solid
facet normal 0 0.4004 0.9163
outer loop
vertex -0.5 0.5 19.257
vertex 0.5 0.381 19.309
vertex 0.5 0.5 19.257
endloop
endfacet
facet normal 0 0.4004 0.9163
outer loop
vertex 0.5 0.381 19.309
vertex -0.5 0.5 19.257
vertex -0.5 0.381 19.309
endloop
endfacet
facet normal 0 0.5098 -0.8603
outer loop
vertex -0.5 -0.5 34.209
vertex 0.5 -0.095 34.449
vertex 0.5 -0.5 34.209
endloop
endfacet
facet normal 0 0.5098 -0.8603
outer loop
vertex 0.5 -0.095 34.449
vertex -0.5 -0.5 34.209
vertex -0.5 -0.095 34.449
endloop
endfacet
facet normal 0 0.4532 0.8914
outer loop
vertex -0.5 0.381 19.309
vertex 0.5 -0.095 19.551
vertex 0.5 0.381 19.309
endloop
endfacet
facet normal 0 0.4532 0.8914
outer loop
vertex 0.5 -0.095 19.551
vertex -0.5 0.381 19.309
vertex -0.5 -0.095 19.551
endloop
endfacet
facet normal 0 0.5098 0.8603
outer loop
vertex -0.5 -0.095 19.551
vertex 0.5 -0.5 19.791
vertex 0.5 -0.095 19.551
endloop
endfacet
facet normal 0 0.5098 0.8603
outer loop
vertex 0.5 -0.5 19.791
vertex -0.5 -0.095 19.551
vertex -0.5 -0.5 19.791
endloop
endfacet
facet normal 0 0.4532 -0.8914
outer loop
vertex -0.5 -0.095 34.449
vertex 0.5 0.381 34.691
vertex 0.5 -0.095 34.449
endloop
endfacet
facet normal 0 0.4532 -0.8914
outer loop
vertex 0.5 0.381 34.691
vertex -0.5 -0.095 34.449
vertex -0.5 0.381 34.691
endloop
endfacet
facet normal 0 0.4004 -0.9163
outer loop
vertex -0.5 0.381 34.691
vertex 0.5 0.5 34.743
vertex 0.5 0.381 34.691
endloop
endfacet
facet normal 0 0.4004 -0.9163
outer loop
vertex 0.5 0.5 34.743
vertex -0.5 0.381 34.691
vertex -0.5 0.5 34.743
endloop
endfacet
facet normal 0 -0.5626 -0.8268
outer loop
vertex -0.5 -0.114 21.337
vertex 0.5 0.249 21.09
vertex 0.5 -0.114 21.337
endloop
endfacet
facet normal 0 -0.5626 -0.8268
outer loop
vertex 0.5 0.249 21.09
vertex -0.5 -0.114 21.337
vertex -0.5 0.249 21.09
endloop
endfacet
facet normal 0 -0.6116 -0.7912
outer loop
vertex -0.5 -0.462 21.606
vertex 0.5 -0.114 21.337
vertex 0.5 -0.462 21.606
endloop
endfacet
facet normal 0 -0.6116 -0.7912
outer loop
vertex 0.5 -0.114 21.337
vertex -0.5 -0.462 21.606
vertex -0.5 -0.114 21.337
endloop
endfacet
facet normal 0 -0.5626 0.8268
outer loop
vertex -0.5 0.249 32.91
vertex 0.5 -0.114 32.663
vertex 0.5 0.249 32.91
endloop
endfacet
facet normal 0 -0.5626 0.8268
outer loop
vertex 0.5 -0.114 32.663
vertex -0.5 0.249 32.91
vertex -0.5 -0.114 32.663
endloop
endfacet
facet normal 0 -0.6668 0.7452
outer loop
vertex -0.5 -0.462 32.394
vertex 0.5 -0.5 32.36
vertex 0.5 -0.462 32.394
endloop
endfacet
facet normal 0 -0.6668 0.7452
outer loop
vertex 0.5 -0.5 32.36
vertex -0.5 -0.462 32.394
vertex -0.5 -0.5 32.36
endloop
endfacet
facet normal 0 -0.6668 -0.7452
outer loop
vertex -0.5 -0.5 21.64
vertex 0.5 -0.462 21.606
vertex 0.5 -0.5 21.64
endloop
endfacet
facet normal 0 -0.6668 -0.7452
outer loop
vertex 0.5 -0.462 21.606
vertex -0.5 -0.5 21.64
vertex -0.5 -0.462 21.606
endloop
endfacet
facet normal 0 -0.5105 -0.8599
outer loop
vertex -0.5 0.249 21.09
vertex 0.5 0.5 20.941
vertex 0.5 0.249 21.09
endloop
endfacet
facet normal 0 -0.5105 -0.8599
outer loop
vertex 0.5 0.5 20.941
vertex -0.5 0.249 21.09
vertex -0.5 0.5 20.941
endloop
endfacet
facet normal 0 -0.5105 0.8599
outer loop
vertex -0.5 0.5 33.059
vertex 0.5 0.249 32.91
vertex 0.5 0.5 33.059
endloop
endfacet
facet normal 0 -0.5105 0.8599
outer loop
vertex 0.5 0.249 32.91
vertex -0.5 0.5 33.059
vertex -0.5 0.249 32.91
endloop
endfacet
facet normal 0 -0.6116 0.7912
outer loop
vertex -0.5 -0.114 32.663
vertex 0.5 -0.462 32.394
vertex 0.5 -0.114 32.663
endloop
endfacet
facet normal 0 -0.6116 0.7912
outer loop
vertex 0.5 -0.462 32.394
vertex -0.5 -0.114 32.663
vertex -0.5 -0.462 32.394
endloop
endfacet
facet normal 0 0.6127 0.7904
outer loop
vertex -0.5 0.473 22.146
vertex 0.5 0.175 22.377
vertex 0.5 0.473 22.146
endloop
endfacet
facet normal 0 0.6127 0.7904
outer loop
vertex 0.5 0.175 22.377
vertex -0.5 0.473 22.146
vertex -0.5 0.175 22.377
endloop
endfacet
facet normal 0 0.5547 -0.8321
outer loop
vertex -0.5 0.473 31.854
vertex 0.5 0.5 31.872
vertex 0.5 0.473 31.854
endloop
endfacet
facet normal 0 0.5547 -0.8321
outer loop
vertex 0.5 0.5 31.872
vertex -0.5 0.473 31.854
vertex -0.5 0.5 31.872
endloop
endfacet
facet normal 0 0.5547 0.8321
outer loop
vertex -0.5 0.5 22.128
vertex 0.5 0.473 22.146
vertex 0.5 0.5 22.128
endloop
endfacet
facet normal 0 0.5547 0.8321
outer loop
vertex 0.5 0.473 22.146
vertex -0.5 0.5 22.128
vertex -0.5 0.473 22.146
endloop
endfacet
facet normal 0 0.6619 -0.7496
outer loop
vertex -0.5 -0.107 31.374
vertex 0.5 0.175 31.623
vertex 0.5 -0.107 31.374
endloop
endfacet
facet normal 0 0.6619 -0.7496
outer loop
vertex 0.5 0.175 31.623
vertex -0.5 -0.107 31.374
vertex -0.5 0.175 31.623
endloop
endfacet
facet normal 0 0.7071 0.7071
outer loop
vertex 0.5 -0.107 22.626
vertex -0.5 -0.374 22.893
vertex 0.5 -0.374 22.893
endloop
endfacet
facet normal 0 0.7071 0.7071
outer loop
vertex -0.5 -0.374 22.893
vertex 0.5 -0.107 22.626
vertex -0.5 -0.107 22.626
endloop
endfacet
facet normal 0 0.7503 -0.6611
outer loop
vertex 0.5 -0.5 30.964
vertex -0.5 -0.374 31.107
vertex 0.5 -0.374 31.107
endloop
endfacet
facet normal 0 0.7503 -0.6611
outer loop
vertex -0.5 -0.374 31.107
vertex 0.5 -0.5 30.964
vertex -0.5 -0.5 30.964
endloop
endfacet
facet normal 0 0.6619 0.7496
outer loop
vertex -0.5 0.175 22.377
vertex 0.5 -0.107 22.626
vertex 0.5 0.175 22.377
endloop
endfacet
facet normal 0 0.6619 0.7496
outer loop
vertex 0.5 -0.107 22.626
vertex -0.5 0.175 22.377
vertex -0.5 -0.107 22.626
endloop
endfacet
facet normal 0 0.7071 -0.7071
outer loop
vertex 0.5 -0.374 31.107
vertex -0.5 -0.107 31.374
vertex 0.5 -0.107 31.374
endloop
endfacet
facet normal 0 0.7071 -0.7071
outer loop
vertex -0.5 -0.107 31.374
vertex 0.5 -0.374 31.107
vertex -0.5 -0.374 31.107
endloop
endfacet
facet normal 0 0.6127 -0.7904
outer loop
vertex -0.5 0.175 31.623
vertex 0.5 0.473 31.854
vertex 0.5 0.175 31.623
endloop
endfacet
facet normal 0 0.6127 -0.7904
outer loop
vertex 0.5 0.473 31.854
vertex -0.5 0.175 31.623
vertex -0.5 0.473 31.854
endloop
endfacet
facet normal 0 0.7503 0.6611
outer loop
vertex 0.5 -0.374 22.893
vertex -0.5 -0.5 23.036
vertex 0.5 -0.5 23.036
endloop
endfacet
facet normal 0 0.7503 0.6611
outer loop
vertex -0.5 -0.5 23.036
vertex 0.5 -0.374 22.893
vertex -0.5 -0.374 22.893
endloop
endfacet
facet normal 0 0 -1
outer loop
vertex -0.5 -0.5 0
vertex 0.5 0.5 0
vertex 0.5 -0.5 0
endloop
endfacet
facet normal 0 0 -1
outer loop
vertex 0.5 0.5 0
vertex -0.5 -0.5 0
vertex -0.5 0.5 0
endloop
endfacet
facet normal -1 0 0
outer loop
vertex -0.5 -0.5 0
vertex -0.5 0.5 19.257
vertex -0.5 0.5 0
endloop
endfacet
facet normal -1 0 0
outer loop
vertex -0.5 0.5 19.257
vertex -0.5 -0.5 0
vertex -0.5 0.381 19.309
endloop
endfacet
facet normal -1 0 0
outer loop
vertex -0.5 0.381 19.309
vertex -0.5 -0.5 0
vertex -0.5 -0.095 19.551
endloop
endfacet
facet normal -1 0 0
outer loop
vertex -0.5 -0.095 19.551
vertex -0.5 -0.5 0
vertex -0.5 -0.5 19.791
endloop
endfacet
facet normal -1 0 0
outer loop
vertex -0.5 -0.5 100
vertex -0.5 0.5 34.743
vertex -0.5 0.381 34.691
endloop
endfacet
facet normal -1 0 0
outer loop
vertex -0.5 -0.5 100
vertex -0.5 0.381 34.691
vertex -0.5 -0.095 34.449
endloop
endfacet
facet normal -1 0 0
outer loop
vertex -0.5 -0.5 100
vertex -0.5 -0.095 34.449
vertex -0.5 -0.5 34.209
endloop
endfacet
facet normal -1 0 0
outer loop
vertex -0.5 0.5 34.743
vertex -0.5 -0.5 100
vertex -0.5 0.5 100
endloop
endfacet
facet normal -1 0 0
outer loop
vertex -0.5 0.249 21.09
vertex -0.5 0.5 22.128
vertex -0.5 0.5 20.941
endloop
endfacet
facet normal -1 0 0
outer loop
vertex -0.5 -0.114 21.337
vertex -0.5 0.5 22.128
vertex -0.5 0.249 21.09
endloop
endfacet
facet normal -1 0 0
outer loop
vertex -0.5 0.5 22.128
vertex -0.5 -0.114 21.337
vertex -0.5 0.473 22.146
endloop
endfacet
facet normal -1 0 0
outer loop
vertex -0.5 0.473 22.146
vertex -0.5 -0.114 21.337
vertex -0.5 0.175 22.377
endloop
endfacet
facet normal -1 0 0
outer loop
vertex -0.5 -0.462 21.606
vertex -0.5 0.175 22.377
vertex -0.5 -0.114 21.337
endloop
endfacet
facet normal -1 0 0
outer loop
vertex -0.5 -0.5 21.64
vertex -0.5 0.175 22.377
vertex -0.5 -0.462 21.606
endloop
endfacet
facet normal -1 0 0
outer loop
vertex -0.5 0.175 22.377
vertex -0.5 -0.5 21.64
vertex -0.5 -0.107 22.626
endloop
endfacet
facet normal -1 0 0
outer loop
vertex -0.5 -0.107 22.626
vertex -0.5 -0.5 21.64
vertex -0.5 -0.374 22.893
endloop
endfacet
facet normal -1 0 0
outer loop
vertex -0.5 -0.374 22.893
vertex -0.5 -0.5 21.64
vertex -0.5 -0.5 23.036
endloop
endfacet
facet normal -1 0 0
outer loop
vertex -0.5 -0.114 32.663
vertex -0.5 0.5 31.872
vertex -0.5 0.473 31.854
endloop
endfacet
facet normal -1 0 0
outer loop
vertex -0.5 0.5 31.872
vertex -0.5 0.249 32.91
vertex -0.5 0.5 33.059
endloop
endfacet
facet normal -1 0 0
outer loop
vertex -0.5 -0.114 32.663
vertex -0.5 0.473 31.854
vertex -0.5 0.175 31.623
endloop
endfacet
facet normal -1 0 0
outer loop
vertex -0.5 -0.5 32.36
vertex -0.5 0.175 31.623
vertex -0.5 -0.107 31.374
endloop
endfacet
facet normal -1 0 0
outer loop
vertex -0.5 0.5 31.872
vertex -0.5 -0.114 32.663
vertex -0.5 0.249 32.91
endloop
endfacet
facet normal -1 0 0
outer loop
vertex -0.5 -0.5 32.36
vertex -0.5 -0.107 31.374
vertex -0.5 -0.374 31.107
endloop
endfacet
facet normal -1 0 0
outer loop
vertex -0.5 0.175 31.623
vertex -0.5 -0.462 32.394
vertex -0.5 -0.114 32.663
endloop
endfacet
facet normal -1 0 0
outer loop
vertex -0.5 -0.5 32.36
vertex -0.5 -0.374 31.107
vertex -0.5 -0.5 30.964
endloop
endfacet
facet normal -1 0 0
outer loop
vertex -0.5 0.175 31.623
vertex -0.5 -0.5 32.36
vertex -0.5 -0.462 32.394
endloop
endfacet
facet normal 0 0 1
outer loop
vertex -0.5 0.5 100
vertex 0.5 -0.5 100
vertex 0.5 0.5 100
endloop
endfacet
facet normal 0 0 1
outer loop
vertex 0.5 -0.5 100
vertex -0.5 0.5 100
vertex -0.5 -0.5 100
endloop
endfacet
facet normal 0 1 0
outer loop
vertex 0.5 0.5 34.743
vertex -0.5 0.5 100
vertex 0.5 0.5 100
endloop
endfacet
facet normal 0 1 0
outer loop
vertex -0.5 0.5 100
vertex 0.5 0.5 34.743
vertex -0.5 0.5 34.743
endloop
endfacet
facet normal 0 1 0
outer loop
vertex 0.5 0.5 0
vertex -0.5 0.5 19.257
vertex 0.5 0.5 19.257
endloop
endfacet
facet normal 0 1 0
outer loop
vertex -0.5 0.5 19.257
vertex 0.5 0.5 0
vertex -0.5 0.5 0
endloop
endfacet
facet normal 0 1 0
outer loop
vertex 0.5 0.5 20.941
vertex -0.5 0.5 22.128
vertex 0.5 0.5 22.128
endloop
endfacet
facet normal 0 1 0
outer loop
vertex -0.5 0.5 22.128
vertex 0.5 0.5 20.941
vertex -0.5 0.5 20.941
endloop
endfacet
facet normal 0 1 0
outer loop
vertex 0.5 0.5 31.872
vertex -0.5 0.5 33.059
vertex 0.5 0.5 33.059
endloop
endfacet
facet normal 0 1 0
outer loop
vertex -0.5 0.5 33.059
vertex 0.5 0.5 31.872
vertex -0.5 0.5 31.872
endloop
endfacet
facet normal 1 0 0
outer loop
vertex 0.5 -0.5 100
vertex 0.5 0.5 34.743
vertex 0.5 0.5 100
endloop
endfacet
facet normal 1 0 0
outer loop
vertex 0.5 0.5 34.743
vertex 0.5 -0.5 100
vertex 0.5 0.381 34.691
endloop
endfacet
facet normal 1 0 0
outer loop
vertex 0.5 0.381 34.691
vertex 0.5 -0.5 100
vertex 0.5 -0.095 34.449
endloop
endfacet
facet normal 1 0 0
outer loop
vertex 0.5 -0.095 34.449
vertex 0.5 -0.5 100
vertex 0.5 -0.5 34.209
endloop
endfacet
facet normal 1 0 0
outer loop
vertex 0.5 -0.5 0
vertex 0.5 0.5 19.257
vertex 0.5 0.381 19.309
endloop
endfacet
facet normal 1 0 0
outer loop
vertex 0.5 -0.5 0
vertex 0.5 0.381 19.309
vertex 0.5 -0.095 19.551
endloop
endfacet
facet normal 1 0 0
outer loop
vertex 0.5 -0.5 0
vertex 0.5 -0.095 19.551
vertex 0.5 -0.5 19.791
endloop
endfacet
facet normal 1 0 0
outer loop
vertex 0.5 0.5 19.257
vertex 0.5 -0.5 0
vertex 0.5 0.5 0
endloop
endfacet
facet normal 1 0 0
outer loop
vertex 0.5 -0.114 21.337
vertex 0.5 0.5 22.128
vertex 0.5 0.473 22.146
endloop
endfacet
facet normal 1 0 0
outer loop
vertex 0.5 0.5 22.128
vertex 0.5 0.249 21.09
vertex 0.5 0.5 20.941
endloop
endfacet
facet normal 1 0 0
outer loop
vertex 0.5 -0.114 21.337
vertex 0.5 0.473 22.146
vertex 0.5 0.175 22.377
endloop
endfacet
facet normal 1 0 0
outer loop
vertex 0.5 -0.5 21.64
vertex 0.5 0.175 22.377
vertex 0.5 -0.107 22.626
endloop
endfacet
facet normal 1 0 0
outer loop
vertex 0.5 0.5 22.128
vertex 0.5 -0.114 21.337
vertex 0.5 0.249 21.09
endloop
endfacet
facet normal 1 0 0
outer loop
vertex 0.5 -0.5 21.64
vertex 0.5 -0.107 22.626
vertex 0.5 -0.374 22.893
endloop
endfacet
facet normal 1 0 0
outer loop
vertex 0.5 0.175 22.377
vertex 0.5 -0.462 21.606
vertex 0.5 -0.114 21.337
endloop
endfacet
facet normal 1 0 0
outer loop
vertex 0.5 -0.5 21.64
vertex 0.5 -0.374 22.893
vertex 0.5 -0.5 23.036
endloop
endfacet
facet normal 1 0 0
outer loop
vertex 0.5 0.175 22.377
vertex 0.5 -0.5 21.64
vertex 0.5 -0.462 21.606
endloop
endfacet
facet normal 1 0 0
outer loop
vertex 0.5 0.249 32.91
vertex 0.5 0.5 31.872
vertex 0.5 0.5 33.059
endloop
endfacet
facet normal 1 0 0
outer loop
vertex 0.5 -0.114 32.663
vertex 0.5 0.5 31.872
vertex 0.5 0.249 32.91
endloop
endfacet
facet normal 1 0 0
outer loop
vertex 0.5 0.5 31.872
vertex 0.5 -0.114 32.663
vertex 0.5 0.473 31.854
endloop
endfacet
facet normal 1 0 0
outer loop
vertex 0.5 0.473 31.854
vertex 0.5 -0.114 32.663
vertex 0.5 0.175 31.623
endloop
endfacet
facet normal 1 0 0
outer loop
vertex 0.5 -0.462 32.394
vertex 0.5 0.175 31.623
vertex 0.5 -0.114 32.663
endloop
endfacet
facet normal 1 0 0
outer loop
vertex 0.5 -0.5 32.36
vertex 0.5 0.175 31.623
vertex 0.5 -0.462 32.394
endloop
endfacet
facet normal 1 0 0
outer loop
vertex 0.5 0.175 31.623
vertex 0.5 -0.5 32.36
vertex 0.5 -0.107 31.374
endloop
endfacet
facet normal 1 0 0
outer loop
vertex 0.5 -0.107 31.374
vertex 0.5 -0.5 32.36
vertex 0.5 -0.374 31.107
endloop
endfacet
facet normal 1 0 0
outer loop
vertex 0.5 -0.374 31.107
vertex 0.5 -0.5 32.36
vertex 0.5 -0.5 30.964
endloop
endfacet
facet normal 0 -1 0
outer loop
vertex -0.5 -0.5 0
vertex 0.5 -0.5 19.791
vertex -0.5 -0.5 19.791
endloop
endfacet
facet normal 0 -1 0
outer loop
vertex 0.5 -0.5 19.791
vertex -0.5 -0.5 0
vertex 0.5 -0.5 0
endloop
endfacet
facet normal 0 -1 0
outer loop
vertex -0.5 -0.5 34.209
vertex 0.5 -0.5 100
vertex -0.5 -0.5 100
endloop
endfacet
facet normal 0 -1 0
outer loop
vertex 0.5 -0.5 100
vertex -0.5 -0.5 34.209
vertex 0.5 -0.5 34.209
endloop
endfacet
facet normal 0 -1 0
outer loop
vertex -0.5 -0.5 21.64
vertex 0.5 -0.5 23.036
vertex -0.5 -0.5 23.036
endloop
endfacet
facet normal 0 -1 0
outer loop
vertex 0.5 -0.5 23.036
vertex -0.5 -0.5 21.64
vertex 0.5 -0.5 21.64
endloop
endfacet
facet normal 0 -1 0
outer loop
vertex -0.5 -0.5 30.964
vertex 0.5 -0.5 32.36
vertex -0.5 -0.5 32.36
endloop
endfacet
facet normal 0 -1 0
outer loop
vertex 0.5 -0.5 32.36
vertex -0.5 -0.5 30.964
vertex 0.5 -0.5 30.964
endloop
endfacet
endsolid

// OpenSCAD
// file: roundedcube.scad
// Higher definition curves
$fs = 0.01;

module roundedcube(size = [1, 1, 1], center = false, radius = 0.5, apply_to = "all") {
	// If single value, convert to [x, y, z] vector
	size = (size[0] == undef) ? [size, size, size] : size;

	translate_min = radius;
	translate_xmax = size[0] - radius;
	translate_ymax = size[1] - radius;
	translate_zmax = size[2] - radius;

	diameter = radius * 2;

	module build_point(type = "sphere", rotate = [0, 0, 0]) {
		if (type == "sphere") {
			sphere(r = radius);
		} else if (type == "cylinder") {
			rotate(a = rotate)
			cylinder(h = diameter, r = radius, center = true);
		}
	}

	obj_translate = (center == false) ?
		[0, 0, 0] : [
			-(size[0] / 2),
			-(size[1] / 2),
			-(size[2] / 2)
		];

	translate(v = obj_translate) {
		hull() {
			for (translate_x = [translate_min, translate_xmax]) {
				x_at = (translate_x == translate_min) ? "min" : "max";
				for (translate_y = [translate_min, translate_ymax]) {
					y_at = (translate_y == translate_min) ? "min" : "max";
					for (translate_z = [translate_min, translate_zmax]) {
						z_at = (translate_z == translate_min) ? "min" : "max";

						translate(v = [translate_x, translate_y, translate_z])
						if (
							(apply_to == "all") ||
							(apply_to == "xmin" && x_at == "min") || (apply_to == "xmax" && x_at == "max") ||
							(apply_to == "ymin" && y_at == "min") || (apply_to == "ymax" && y_at == "max") ||
							(apply_to == "zmin" && z_at == "min") || (apply_to == "zmax" && z_at == "max")
						) {
							build_point("sphere");
						} else {
							rotate =
								(apply_to == "xmin" || apply_to == "xmax" || apply_to == "x") ? [0, 90, 0] : (
								(apply_to == "ymin" || apply_to == "ymax" || apply_to == "y") ? [90, 90, 0] :
								[0, 0, 0]
							);
							build_point("cylinder", rotate);
						}
					}
				}
			}
		}
	}
}

module roundedcubez(size = [1, 1, 1], center = false, radius = 0.5, apply_to = "all") {
	intersection() {
		roundedcube(size, center, radius, apply_to="z");
		scale([1.0, 1.0, 1.1])
			cube(size, center);
	}
}

// The good stuff!!!!  Forget about the whack stuff above.
// centered on XY only
module cube_(size=[1, 1, 1])
	translate([-size[0] / 2, -size[1] / 2, 0])
		cube(size);

// centered on XY only
module roundedcubez_(size = [1, 1, 1], radius = 0.5) {
	linear_extrude(height=size[2]) {
		square([size[0] - 2 * radius, size[1]], center=true);
		square([size[0], size[1] - 2 * radius], center=true);
		for (i=[-1, 1])
			for (j=[-1, 1])
				translate([i * (size[0] / 2 - radius), j * (size[1] / 2 - radius), 0])
					circle(r = radius);
	}
}
// main file
$fn = $preview ? 30 : 100;
include <roundedcube.scad>

module laser() {
	translate([0, 0, 27]) {
		rotate([0, 90, 0]) {
			cylinder(h=20, d=12, center=true);
			ring(14);
		}
	}
}

module ring(d=10) {
	difference() {
		cylinder(h=5, d=d + 3, center=true);
		cylinder(h=6, d=d, center=true);
	}
}

module holder() {
	difference() {
		roundedcubez_(size=[15, 40, 27], 5);
		translate([0, 4, 0])
			laser();
		for (i=[-1, 1]) {
			translate([0, i * 10, 0])
				cylinder(h=30, d=3.5, center=true);
			translate([0, i * 18, 4])
				cube(size=[6, 25, 2], center=true);
		}
	}
}

intersection() {
	holder();
	// translate([-50, 0, 0])
	// 	cube(size=[100, 100, 100], center=true);
}
